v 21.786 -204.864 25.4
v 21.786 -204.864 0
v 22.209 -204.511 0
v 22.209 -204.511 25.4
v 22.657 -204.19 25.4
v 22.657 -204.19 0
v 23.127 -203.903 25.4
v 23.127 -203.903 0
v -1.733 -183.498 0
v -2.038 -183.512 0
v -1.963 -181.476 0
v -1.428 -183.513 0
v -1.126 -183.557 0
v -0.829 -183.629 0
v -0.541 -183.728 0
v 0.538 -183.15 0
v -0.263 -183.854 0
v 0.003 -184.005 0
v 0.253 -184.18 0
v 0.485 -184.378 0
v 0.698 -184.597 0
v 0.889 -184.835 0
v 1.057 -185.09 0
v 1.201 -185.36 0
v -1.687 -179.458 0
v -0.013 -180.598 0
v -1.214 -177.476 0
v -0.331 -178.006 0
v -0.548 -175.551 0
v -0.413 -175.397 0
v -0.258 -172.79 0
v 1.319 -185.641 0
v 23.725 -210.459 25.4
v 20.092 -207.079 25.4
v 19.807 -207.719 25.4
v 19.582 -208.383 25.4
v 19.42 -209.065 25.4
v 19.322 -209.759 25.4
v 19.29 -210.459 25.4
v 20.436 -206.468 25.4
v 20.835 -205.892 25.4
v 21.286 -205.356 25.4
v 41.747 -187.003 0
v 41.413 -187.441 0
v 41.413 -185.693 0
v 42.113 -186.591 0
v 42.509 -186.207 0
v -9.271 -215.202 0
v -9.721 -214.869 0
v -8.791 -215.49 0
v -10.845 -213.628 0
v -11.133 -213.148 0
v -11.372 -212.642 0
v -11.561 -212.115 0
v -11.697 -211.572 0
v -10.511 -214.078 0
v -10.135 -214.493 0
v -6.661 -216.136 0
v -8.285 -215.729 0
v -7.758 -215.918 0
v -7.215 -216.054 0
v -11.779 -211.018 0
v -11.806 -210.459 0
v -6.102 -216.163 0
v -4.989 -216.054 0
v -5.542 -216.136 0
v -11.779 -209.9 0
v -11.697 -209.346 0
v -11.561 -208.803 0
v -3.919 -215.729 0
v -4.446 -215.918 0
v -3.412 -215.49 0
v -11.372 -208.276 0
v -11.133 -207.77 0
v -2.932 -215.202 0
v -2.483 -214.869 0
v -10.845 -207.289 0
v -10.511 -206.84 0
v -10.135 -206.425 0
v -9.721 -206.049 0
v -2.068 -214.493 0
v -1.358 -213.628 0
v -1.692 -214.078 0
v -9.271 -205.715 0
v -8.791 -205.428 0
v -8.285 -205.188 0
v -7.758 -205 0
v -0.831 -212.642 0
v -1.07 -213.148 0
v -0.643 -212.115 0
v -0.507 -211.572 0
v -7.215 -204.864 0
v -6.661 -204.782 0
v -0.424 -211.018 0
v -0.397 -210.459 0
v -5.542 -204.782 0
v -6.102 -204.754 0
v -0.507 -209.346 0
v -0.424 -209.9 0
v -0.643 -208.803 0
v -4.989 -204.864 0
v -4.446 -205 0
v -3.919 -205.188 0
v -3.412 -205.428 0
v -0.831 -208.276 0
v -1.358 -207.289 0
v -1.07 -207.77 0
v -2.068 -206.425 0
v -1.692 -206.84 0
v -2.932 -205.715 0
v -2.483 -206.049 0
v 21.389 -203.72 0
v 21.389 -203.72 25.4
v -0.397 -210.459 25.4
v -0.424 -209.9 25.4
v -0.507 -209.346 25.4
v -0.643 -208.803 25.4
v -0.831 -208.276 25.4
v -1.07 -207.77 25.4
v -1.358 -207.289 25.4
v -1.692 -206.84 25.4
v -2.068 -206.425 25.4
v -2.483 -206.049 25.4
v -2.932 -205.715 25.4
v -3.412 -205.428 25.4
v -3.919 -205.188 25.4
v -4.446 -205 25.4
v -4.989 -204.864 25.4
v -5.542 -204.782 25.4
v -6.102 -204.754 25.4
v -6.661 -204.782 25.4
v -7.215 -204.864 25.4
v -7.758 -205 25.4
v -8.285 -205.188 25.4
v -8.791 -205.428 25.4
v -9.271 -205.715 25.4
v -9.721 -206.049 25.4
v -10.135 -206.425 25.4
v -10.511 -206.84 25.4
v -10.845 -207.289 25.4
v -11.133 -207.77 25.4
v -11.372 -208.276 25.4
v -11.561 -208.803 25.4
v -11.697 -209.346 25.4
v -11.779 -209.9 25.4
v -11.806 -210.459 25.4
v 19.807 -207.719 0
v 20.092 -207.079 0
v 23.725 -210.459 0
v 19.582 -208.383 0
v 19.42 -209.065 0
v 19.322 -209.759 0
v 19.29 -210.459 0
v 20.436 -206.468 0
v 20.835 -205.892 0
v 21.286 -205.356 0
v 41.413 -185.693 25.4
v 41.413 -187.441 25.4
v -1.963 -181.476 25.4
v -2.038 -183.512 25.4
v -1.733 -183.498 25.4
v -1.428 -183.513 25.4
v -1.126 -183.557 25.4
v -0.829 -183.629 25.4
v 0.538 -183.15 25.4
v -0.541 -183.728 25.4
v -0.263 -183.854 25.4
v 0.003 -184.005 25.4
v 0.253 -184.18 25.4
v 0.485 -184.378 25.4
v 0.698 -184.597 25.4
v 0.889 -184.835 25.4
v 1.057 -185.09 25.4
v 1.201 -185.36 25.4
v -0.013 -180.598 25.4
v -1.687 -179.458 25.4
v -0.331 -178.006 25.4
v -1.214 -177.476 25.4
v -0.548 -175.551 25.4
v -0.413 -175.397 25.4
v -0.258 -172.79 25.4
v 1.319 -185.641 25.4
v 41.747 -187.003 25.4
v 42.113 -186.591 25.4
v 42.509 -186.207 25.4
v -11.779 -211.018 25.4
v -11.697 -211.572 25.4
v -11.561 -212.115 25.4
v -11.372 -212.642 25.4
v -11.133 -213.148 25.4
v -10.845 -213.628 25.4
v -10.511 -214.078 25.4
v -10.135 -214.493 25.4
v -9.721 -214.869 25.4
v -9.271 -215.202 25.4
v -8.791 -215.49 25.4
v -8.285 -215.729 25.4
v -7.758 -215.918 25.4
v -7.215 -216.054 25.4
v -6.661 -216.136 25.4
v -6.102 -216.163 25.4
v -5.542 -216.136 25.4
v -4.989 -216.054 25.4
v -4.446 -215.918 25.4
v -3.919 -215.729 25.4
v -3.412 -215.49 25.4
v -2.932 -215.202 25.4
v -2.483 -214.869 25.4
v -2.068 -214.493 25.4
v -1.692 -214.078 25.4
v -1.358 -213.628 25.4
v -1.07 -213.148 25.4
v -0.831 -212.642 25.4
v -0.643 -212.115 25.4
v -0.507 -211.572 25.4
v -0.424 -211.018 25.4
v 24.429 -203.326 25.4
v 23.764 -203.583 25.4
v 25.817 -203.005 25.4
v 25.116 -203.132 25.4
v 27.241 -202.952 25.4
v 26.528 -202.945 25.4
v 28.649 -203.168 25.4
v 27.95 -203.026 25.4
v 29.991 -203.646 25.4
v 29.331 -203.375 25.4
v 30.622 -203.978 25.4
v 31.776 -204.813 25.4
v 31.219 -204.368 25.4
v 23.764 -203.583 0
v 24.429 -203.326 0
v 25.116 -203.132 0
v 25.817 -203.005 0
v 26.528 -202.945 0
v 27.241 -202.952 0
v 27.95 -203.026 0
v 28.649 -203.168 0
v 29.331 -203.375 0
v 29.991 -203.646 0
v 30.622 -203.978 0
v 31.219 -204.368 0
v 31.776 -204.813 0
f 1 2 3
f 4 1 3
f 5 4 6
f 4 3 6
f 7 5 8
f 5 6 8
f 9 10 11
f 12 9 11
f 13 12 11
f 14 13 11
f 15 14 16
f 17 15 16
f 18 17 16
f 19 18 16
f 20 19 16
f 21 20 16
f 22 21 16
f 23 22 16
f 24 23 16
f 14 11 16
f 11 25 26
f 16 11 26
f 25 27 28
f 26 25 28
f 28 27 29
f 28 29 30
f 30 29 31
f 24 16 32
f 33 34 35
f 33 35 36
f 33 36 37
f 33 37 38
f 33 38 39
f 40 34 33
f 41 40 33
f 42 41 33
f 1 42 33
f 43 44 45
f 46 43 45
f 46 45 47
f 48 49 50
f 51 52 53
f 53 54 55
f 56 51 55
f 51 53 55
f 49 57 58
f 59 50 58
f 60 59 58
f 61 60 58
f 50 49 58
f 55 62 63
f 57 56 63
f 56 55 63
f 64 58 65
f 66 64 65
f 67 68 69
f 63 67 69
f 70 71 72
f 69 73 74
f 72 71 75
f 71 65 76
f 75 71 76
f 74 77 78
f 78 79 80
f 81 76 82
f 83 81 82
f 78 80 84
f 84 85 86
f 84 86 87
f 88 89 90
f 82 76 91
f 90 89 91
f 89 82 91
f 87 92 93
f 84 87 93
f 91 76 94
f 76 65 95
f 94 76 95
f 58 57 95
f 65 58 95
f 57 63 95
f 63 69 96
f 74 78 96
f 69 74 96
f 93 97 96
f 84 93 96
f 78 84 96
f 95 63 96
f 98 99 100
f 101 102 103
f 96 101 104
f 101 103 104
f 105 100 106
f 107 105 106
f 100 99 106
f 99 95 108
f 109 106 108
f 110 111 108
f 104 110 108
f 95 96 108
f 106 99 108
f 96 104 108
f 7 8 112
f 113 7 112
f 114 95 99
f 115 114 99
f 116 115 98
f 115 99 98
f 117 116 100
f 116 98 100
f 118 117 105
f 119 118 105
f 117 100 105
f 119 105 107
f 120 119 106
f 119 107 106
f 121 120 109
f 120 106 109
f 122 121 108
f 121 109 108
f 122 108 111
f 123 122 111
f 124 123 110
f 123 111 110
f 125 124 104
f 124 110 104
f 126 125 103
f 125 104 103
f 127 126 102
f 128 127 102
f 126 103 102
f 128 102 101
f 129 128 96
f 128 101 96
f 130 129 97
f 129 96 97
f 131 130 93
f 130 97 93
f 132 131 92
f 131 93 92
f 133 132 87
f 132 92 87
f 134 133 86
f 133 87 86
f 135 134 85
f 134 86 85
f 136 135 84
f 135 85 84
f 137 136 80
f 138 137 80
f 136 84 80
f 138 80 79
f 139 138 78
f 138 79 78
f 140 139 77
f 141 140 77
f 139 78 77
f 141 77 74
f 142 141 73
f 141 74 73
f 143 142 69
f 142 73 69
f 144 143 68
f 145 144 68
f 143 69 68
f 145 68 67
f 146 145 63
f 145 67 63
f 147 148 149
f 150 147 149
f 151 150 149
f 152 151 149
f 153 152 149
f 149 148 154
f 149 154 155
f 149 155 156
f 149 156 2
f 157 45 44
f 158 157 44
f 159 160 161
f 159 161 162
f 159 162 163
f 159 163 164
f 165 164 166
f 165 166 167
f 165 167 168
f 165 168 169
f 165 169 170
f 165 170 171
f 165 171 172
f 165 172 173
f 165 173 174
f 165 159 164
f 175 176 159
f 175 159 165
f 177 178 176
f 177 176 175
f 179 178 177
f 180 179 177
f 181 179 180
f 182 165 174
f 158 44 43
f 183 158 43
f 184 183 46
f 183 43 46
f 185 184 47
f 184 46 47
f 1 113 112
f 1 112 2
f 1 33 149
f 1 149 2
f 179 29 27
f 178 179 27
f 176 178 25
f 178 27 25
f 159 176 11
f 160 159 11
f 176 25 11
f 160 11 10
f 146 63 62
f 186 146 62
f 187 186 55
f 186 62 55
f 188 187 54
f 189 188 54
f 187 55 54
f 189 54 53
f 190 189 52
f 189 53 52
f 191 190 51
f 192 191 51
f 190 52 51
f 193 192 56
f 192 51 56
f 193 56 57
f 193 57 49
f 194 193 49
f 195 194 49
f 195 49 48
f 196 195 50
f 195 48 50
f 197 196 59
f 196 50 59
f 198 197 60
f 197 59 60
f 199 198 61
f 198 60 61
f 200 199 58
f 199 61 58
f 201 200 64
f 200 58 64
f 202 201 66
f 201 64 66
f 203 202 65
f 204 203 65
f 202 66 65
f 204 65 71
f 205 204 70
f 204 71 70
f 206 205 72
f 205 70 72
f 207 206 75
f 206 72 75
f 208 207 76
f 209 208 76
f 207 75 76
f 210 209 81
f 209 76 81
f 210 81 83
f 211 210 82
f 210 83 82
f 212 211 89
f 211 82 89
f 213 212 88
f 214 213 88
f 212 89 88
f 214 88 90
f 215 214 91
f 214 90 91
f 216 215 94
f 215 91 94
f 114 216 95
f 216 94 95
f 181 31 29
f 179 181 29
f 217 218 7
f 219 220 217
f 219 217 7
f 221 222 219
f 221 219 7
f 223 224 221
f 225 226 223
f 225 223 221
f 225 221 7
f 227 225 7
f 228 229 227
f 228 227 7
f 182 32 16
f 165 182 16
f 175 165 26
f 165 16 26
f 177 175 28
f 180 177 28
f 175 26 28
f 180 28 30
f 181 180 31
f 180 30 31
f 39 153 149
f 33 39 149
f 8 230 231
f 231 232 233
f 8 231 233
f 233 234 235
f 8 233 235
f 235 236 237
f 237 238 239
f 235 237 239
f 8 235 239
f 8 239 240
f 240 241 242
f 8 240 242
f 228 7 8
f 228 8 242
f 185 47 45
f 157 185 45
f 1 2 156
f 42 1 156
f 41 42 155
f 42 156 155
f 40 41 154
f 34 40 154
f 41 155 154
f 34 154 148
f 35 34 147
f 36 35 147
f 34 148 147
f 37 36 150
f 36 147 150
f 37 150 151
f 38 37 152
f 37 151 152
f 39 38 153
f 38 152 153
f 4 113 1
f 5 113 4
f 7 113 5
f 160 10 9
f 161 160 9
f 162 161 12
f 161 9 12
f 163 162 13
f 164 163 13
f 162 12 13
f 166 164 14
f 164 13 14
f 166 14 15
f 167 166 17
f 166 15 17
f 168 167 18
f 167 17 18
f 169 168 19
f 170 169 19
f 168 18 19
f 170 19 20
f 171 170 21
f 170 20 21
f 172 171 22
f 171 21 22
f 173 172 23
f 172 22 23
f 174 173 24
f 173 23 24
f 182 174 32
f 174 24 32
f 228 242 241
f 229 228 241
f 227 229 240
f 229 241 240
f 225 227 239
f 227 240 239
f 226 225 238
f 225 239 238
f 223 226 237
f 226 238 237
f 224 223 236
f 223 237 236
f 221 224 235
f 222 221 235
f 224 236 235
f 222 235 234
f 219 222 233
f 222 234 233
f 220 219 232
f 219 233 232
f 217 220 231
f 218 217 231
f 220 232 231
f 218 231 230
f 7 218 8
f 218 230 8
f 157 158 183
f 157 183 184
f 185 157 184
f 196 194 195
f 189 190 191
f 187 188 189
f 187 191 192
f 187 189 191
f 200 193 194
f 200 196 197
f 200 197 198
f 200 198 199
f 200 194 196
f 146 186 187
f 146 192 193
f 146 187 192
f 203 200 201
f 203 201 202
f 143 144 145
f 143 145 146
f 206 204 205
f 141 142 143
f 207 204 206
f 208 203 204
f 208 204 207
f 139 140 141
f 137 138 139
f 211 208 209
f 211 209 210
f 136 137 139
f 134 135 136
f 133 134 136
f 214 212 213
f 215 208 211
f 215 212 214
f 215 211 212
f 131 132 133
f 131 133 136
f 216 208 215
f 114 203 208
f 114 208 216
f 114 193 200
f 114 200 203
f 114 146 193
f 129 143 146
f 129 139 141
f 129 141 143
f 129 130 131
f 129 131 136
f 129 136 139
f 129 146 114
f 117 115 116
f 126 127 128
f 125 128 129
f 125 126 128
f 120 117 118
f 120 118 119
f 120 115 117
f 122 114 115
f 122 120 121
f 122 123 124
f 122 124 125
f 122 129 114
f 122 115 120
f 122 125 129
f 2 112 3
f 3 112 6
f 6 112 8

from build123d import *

# Parameters (mm, degrees)
F1_DEPTH = 25.4


with BuildPart() as f1:
    # F0 (on Top) → F1 (new body)
    with BuildSketch(Plane.XY):
        with BuildLine():
            ThreePointArc((-0.39689, -210.458777), (-6.101603, -204.754064), (-11.806316, -210.458777))
            Line((-11.806316, -210.458777), (-6.101603, -210.458777))
            Line((-6.101603, -210.458777), (-0.39689, -210.458777))
        make_face()
        with BuildLine():
            Line((-6.101603, -210.458777), (-11.806316, -210.458777))
            ThreePointArc((-11.806316, -210.458777), (-6.101603, -216.163491), (-0.39689, -210.458777))
            Line((-0.39689, -210.458777), (-6.101603, -210.458777))
        make_face()
        with BuildLine():
            Line((42.508696, -186.207263), (41.412545, -185.693204))
            Line((41.412545, -185.693204), (41.412545, -187.440656))
            ThreePointArc((41.412545, -187.440656), (41.926686, -186.793801), (42.508696, -186.207263))
        make_face()
        with BuildLine():
            Line((23.12689, -203.902571), (31.775724, -204.812954))
            ThreePointArc((31.775724, -204.812954), (27.596267, -202.980612), (23.12689, -203.902571))
        make_face()
        with BuildLine():
            Line((23.724803, -210.458777), (21.785525, -204.863585))
            ThreePointArc((21.785525, -204.863585), (19.941893, -207.395459), (19.289629, -210.458777))
            Line((19.289629, -210.458777), (23.724803, -210.458777))
        make_face()
        with BuildLine():
            ThreePointArc((21.785525, -204.863585), (22.429767, -204.346173), (23.12689, -203.902571))
            Line((23.12689, -203.902571), (21.389038, -203.719644))
            Line((21.389038, -203.719644), (21.785525, -204.863585))
        make_face()
        with BuildLine():
            ThreePointArc((-0.54828, -175.550783), (-1.687482, -179.457525), (-2.038437, -183.511813))
            ThreePointArc((-2.038437, -183.511813), (0.002707, -184.004831), (1.318575, -185.641239))
            ThreePointArc((1.318575, -185.641239), (-0.20176, -179.305596), (-0.257713, -172.790333))
            Line((-0.257713, -172.790333), (-0.54828, -175.550783))
        make_face()
    extrude(amount=F1_DEPTH)


solid = f1.part
